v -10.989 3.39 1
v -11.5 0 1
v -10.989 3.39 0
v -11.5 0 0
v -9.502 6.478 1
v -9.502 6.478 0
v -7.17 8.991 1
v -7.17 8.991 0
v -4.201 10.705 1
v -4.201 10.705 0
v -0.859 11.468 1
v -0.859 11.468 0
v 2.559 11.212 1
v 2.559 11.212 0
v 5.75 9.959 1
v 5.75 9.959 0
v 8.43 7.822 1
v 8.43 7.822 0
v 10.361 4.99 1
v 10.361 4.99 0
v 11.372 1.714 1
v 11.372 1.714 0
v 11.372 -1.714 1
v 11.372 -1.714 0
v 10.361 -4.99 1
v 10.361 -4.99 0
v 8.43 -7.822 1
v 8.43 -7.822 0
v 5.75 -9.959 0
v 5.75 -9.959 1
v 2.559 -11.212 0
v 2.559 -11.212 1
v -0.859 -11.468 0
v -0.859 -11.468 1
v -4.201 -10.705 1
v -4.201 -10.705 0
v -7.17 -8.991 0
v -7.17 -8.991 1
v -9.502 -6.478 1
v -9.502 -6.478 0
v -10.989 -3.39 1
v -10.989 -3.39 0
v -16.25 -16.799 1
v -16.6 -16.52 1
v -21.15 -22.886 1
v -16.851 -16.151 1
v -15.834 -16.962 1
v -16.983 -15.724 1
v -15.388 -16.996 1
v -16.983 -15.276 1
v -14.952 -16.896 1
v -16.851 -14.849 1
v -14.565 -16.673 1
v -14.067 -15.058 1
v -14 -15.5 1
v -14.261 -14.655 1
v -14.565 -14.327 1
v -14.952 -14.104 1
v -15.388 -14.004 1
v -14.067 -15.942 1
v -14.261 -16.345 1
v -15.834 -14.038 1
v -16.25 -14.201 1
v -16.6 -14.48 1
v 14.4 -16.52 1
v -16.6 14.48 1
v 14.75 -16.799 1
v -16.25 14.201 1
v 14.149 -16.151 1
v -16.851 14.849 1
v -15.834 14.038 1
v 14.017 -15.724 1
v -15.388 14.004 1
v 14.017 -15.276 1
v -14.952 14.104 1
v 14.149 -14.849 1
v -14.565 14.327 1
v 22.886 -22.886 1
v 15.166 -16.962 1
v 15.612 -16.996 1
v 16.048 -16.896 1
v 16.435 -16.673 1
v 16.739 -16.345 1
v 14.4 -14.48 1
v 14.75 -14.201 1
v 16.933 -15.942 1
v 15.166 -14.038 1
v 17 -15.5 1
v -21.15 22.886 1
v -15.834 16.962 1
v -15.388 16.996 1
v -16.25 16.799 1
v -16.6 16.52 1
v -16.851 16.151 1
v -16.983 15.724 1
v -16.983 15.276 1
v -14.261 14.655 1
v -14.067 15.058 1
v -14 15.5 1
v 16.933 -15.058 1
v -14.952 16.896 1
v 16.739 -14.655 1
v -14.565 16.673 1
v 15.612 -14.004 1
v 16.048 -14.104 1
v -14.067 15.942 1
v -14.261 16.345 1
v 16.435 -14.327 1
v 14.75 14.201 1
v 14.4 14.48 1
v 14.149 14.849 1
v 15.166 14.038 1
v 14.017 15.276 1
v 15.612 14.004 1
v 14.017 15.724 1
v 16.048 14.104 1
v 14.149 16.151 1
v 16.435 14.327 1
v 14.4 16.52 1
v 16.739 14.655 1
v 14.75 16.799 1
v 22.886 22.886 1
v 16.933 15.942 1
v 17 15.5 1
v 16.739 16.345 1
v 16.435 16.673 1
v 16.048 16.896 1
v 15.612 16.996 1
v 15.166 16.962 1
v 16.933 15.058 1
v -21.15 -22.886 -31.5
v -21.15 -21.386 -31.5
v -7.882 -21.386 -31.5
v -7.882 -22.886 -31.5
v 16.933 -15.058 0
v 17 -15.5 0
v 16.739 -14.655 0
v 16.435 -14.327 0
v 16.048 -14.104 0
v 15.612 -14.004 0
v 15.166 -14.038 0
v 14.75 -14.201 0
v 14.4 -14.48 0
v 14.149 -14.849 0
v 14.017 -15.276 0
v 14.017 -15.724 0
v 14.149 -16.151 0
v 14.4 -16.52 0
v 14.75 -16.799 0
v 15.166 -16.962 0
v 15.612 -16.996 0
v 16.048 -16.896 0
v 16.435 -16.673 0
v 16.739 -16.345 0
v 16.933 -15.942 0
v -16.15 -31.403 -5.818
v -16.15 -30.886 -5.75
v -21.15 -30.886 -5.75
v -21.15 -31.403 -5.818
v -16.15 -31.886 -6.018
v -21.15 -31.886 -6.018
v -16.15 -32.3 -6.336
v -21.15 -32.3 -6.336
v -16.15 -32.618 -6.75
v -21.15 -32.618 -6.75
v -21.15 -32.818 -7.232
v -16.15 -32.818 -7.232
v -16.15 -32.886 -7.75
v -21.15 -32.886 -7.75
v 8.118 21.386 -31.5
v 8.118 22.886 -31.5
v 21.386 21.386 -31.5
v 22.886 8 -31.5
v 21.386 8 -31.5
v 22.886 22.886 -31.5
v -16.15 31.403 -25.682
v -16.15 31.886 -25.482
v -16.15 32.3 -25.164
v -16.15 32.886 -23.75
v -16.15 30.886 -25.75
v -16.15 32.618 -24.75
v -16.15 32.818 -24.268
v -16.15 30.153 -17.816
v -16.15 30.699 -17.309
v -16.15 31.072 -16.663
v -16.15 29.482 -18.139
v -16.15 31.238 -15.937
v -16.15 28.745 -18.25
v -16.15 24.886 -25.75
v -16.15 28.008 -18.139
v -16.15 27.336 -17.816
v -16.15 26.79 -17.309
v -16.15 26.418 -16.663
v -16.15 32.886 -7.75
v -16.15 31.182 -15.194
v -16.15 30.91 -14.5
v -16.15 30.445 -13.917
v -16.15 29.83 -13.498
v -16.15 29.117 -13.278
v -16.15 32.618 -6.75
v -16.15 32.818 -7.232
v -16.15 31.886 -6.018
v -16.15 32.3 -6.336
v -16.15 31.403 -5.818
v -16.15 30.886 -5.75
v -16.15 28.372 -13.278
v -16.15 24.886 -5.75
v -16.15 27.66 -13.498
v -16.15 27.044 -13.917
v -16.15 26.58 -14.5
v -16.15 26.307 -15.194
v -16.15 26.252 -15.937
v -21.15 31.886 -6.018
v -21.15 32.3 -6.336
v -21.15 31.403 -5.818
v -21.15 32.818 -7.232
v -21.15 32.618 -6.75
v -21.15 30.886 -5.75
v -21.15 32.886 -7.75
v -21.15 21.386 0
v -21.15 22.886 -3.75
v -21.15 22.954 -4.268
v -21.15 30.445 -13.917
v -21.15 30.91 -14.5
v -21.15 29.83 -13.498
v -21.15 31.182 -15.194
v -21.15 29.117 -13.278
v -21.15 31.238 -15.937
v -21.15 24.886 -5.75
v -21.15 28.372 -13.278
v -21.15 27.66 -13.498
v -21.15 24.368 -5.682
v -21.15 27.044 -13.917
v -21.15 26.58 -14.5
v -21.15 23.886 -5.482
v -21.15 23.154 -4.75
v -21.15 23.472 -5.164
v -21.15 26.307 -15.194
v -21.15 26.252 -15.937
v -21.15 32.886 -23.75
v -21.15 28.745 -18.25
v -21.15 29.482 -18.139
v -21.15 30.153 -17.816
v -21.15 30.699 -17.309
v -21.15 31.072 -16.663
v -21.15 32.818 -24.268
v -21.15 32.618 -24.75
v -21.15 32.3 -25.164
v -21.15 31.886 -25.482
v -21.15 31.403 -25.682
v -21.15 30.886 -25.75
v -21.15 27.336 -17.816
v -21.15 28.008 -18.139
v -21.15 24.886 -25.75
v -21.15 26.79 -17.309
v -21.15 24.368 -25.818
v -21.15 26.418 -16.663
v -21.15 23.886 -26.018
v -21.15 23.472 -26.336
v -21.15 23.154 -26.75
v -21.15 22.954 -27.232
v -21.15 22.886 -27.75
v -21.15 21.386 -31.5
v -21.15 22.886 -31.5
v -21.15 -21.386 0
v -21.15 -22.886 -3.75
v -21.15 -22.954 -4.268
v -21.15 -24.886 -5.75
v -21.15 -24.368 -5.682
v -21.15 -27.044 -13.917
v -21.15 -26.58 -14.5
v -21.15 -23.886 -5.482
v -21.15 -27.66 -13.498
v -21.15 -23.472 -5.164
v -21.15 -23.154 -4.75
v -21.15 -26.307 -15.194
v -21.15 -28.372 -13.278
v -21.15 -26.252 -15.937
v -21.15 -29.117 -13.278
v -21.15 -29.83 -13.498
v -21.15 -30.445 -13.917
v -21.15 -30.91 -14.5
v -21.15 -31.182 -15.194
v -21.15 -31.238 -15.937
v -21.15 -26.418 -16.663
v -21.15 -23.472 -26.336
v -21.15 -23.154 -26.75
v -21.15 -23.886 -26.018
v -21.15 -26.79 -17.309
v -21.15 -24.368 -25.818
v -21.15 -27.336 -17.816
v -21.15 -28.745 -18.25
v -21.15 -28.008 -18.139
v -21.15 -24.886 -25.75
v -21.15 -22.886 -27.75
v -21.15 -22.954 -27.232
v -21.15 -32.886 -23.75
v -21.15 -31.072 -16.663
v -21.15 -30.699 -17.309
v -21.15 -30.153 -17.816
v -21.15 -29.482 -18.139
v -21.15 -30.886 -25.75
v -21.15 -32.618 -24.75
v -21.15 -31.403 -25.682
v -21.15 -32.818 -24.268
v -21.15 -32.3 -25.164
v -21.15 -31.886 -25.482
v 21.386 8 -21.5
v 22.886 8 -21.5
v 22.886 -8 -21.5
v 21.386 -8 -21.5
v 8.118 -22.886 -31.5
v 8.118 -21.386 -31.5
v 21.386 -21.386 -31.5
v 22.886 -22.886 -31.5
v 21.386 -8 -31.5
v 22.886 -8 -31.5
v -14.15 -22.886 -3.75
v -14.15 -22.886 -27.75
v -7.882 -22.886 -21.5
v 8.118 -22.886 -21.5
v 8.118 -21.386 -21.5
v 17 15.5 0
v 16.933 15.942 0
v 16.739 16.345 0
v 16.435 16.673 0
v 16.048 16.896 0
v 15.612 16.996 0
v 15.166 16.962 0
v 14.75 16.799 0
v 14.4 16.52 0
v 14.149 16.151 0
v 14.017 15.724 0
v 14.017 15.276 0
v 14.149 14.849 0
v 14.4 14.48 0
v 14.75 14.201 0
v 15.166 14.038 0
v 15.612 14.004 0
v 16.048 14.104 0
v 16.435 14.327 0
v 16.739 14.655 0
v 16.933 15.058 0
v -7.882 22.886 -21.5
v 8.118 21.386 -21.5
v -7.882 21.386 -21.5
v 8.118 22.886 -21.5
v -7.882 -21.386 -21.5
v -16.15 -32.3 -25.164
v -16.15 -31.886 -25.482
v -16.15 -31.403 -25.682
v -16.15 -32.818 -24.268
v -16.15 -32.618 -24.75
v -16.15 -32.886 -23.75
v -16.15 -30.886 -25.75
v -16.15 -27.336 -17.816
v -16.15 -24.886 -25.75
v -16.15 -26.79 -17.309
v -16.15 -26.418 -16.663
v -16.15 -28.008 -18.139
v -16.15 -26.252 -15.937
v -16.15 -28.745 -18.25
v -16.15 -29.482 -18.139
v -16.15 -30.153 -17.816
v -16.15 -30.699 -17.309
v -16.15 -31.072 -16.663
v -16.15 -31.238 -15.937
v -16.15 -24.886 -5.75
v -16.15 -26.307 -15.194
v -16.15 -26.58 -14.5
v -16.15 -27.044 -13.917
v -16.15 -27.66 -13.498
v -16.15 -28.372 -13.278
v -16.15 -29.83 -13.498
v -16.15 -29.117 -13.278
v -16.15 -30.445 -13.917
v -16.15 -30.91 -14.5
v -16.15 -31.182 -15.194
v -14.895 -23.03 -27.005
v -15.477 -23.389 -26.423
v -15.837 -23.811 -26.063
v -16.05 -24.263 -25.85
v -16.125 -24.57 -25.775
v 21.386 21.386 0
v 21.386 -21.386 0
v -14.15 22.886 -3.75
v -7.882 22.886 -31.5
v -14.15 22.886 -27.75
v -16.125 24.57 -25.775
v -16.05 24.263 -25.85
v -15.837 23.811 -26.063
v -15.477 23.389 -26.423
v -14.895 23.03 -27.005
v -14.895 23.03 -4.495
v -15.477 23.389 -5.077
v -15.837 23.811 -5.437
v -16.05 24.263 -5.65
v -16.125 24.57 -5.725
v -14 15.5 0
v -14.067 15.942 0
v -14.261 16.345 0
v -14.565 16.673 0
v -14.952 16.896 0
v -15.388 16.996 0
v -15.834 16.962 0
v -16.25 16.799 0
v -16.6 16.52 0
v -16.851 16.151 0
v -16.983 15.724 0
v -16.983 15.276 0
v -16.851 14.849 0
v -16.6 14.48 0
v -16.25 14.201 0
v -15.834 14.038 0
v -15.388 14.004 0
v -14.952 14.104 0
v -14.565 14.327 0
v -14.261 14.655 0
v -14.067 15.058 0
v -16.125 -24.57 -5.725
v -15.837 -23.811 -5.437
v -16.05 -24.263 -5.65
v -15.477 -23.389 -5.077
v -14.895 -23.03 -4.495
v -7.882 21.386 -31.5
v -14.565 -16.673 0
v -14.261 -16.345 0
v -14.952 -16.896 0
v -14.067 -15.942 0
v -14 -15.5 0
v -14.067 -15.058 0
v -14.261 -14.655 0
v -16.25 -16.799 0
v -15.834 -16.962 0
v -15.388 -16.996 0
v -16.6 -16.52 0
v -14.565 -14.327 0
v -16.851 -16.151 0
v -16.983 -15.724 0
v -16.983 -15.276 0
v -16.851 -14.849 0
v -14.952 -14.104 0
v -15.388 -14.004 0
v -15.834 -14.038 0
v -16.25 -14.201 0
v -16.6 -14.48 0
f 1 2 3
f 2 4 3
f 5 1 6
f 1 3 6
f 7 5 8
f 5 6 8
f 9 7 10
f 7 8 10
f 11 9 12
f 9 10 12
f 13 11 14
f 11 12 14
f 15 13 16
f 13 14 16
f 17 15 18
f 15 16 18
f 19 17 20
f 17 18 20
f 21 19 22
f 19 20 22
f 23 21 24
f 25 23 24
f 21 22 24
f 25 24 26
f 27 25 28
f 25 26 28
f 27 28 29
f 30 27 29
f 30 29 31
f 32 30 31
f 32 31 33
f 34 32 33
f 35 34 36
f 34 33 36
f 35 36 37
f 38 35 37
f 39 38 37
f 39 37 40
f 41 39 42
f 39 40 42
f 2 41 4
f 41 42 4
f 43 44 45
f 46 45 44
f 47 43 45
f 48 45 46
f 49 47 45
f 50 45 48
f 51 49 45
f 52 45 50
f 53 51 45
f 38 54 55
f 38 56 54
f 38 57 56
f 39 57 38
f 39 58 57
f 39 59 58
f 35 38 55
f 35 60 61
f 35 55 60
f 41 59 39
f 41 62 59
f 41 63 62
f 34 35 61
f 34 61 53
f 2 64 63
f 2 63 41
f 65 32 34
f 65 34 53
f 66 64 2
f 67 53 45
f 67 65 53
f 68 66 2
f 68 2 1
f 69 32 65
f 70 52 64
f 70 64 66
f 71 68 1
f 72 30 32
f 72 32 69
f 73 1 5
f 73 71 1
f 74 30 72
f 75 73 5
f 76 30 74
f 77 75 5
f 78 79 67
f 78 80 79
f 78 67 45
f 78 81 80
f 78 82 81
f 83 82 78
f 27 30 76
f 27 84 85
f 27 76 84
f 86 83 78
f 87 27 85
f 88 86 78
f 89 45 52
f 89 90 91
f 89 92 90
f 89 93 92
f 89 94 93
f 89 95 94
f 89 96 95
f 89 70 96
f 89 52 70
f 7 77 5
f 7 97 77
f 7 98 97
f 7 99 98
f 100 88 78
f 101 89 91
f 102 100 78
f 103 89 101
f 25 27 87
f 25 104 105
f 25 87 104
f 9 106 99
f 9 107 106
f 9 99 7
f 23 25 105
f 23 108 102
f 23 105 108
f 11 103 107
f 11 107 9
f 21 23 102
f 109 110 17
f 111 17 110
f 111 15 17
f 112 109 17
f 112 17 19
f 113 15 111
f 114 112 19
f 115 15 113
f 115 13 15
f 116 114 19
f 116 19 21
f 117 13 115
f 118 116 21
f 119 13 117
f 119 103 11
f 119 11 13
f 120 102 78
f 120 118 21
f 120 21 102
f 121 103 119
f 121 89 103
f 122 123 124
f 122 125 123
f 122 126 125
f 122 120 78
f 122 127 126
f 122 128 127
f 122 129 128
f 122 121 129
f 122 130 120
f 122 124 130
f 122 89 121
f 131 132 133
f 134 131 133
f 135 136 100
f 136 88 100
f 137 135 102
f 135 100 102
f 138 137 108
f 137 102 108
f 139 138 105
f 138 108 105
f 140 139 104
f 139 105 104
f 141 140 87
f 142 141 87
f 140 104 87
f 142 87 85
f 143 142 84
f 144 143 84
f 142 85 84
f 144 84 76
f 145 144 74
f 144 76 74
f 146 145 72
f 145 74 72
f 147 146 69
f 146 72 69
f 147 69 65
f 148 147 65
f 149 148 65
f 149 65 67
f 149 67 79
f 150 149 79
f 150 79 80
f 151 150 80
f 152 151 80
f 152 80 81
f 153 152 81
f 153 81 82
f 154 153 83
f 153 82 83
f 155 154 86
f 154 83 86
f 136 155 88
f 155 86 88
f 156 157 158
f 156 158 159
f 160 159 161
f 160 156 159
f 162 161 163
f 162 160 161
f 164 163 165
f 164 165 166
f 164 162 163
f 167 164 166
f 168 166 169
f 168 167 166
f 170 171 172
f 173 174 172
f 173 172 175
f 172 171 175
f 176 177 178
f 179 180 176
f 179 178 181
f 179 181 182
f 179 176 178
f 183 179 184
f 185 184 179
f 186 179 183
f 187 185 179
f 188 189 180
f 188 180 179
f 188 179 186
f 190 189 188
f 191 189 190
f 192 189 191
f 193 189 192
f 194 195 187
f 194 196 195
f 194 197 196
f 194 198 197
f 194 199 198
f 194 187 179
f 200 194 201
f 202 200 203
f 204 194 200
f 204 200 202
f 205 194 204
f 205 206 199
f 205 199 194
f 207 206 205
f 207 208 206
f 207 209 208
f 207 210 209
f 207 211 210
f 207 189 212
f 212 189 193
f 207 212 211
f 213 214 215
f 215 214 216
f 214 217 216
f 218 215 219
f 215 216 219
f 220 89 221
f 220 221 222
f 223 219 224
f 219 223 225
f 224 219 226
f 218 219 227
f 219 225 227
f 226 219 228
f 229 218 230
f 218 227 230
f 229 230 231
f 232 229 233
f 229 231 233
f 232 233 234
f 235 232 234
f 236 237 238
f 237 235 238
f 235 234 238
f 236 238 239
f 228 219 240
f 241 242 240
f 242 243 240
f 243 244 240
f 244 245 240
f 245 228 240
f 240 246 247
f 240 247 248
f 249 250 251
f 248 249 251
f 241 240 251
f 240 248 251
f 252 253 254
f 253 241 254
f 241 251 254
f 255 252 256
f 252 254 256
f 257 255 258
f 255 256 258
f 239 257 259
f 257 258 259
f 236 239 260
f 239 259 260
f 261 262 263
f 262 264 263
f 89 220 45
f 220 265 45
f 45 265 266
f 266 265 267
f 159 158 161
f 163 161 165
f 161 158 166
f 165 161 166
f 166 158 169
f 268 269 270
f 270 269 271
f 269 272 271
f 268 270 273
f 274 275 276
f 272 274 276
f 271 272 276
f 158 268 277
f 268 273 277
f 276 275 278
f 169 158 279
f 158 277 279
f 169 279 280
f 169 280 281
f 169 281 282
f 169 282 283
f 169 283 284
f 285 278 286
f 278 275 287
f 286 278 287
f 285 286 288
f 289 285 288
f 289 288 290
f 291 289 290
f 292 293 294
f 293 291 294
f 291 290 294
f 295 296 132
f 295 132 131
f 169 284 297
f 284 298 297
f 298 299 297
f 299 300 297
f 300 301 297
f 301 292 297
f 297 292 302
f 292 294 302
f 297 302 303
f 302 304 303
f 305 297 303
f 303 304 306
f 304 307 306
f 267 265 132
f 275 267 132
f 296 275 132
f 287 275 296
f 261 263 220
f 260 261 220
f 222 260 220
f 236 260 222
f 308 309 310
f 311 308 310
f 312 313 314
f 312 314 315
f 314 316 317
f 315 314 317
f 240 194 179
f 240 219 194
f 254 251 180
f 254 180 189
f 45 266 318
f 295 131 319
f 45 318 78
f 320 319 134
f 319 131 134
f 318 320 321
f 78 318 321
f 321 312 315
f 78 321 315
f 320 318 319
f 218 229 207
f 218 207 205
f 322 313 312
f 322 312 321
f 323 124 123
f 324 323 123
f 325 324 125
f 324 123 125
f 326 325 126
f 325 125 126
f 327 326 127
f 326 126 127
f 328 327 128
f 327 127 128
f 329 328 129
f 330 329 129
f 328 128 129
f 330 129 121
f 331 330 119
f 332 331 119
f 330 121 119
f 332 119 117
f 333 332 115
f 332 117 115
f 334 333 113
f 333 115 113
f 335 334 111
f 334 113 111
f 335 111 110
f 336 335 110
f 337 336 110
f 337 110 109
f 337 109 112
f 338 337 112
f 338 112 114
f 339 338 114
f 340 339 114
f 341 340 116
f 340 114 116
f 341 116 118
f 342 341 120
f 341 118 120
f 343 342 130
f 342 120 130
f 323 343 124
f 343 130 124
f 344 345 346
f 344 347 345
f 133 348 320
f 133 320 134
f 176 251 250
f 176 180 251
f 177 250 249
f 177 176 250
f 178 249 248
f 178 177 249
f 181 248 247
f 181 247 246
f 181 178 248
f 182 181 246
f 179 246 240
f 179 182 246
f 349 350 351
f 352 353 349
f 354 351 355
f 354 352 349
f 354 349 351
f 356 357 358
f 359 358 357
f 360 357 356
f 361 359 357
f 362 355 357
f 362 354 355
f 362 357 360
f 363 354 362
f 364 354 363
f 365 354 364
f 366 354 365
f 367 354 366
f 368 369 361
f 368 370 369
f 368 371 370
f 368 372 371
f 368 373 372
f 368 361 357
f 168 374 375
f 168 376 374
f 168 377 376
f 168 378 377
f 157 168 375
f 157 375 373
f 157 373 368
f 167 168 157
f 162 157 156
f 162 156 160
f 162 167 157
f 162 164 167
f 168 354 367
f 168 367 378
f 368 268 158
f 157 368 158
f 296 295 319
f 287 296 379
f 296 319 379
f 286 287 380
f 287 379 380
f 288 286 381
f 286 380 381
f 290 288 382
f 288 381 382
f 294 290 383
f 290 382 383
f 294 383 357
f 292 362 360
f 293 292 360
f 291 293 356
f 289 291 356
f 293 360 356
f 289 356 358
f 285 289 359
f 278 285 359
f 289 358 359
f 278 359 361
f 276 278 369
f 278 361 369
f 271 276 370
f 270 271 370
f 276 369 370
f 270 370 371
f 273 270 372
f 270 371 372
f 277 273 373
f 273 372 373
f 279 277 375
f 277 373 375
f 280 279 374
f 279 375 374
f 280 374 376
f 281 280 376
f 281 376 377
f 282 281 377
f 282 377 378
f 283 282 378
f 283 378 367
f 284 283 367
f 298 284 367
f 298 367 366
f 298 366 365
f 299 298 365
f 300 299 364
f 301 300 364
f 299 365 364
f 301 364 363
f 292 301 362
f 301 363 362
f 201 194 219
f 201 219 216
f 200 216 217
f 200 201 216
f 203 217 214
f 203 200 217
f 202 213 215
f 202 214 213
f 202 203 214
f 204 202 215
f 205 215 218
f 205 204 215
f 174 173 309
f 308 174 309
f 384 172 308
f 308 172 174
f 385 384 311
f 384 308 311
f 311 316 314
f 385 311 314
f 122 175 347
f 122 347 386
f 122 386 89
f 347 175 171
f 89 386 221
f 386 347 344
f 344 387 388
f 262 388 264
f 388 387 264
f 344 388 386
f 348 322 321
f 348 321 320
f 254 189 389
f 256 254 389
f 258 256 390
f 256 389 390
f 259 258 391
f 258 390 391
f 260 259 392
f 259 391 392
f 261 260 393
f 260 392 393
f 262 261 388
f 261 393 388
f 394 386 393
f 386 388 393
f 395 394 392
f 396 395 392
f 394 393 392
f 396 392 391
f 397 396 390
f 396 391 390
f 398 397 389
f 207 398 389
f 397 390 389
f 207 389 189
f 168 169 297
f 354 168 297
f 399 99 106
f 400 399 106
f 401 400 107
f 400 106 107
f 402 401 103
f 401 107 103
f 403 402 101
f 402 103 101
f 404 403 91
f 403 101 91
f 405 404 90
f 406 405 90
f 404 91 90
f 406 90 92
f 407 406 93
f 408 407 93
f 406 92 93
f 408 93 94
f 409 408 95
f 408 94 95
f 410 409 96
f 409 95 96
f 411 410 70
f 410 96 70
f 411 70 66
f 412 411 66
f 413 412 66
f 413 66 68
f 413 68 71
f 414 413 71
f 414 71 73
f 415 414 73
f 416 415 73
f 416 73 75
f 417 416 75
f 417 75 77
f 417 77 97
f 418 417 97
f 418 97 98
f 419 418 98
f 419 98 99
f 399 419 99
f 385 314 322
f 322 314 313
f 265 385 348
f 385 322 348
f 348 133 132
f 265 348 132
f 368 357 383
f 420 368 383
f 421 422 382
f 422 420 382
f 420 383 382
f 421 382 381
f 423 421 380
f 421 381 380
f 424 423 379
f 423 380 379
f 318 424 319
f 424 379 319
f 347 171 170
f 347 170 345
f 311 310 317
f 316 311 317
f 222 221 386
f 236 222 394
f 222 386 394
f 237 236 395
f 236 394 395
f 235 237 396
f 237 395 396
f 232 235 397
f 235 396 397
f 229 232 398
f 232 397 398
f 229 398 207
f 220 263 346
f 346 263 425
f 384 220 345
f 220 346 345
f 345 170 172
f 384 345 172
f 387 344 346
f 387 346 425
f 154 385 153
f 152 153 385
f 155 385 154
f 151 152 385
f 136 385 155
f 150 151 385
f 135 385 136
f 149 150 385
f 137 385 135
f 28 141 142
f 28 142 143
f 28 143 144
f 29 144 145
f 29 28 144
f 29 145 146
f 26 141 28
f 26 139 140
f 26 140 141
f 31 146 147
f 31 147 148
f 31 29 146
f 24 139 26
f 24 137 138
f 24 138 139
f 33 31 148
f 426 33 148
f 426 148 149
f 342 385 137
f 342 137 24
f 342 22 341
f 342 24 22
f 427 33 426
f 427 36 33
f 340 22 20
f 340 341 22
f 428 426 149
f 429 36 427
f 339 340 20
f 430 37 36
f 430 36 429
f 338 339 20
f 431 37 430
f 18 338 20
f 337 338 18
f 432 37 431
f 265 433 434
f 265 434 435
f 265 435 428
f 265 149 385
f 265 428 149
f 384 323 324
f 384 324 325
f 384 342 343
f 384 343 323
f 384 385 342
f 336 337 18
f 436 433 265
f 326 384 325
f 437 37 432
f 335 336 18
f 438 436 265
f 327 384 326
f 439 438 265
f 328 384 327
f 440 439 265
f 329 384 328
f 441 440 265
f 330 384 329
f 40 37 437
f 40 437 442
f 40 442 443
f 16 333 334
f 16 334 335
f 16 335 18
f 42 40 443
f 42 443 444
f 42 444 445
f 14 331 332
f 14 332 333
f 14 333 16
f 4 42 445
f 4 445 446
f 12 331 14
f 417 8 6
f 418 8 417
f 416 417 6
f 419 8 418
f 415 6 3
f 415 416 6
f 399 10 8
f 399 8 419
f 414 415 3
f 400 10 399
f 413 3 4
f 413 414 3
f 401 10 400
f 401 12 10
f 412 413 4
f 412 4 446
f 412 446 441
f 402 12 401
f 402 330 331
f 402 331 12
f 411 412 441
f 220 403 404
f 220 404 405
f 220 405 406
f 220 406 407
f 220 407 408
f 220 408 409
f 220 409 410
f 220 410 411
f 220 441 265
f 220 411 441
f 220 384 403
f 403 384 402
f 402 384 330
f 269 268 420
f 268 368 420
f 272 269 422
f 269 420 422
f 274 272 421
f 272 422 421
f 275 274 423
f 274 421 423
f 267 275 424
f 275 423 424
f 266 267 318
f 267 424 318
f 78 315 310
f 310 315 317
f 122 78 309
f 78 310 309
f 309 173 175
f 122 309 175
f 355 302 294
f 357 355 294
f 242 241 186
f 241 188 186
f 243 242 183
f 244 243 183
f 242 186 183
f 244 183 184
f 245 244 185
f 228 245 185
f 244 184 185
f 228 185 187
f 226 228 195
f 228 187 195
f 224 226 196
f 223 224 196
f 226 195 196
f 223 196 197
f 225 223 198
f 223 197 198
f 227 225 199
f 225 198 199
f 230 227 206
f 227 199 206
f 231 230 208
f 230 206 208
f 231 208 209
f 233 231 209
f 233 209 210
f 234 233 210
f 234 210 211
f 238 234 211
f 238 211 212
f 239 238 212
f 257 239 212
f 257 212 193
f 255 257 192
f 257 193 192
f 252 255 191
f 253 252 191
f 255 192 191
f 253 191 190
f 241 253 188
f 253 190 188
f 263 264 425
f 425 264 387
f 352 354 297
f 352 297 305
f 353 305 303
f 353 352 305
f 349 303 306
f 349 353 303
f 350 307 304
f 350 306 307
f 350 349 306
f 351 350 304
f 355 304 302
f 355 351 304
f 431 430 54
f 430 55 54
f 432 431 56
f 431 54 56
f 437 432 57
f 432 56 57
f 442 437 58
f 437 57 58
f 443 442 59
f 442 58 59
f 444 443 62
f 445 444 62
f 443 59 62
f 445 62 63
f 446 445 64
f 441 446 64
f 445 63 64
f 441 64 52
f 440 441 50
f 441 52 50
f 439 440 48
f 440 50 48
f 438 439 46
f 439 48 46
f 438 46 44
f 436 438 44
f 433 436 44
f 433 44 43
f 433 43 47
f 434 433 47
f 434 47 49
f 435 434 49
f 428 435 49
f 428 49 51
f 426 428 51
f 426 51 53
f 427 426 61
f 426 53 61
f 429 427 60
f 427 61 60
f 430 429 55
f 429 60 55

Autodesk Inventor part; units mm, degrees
ref_plane "YZ Plane" through (0, 0, 0) normal (1, 0, 0) x (0, 1, 0)
ref_plane "XZ Plane" through (0, 0, 0) normal (0, 1, 0) x (-1, 0, 0)
sketch "Sketch1" plane through (0, 0, 0) normal (0, 0, 1) x (1, 0, 0)
  line L0 (20.0607, 17.4322) -> (17.4322, 20.0607) construction
  arc A0 (17.4322, 20.0607) -> (16.3716, 20.5) centre (16.3716, 19) ccw construction
  line L1 (16.3716, 20.5) -> (-16.3716, 20.5) construction
  arc A1 (-16.3716, 20.5) -> (-17.4322, 20.0607) centre (-16.3716, 19) ccw construction
  line L2 (-17.4322, 20.0607) -> (-20.0607, 17.4322) construction
  arc A2 (-20.0607, 17.4322) -> (-20.5, 16.3716) centre (-19, 16.3716) ccw construction
  line L3 (-20.5, 16.3716) -> (-20.5, -16.3716) construction
  arc A3 (-20.5, -16.3716) -> (-20.0607, -17.4322) centre (-19, -16.3716) ccw construction
  line L4 (-20.0607, -17.4322) -> (-17.4322, -20.0607) construction
  arc A4 (-17.4322, -20.0607) -> (-16.3716, -20.5) centre (-16.3716, -19) ccw construction
  line L5 (-16.3716, -20.5) -> (16.3716, -20.5) construction
  arc A5 (16.3716, -20.5) -> (17.4322, -20.0607) centre (16.3716, -19) ccw construction
  line L6 (17.4322, -20.0607) -> (20.0607, -17.4322) construction
  arc A6 (20.0607, -17.4322) -> (20.5, -16.3716) centre (19, -16.3716) ccw construction
  line L7 (20.5, -16.3716) -> (20.5, 16.3716) construction
  arc A7 (20.5, 16.3716) -> (20.0607, 17.4322) centre (19, 16.3716) ccw construction
  circle A8 centre (0, 0) radius 16.5 construction
  circle A9 centre (15.5, 15.5) radius 1.55 construction
  circle A10 centre (15.5, -15.5) radius 1.55 construction
  circle A11 centre (-15.5, -15.5) radius 1.55 construction
  circle A12 centre (-15.5, 15.5) radius 1.55 construction
  line L8 (0, 0) -> (-20.3858, 0) construction
  line L9 (-20.3858, 0) -> (-20.3858, -20.3858) construction
  line L10 (-20.3858, -20.3858) -> (0, -20.3858) construction
  line L11 (0, -20.3858) -> (0, 0) construction
  line L12 (0, 0) -> (-20.3858, 0) construction
  line L13 (-20.3858, 0) -> (-20.3858, 20.3858) construction
  line L14 (-20.3858, 20.3858) -> (0, 20.3858) construction
  line L15 (0, 20.3858) -> (0, 0) construction
  line L16 (0, 0) -> (20.3858, 0) construction
  line L17 (20.3858, 0) -> (20.3858, 20.3858) construction
  line L18 (20.3858, 20.3858) -> (0, 20.3858) construction
  line L19 (0, 20.3858) -> (0, 0) construction
  line L20 (0, 0) -> (20.3858, 0) construction
  line L21 (20.3858, 0) -> (20.3858, -20.3858) construction
  line L22 (20.3858, -20.3858) -> (0, -20.3858) construction
  line L23 (0, -20.3858) -> (0, 0) construction
  line L24 (-20.3858, -20.3858) -> (20.3858, -20.3858)
  line L25 (20.3858, -20.3858) -> (20.3858, 20.3858)
  line L26 (20.3858, 20.3858) -> (-20.3858, 20.3858)
  line L27 (-20.3858, 20.3858) -> (-20.3858, -20.3858)
  line L28 (-21.15, -107.4) -> (-21.15, 107.4) projected
  line L29 (-21.15, 22.8858) -> (22.8858, 22.8858)
  line L30 (22.8858, 22.8858) -> (22.8858, -22.8858)
  line L31 (22.8858, -22.8858) -> (-21.15, -22.8858)
  point P0 (0, 0)
  dimension "d0" = 2.5
ref_plane "Work Plane1" through (-21.15, -21.15, -31.5) normal (0, 0, -1) x (0, 1, 0)
extrude "Extrusion1" add sketch "Sketch1" against normal up to surface (31.5 mm away)
ref_plane "Work Plane2" through (-21.15, -10, -125) normal (1, 0, 0) x (0, 0, 1)
sketch "Sketch2" plane through (-21.15, -10, -125) normal (1, 0, 0) x (0, 0, 1)
  line L0 (125, 12.8858) -> (125, -32.8858) projected
  line L1 (93.5, 12.8858) -> (93.5, -32.8858) projected
  line L2 (125, -32.8858) -> (93.5, -32.8858) projected
  line L3 (125, 12.8858) -> (125, -32.8858) projected
  line L4 (125, 12.8858) -> (93.5, 12.8858) projected
  line L5 (125, -10) -> (93.5, -10) construction
  line L6 (109.25, 12.8858) -> (109.25, -32.8858) construction
  line L7 (109.25, -32.8858) -> (119.25, -32.8858) construction
  line L8 (119.25, -32.8858) -> (119.25, -42.8858)
  line L9 (119.25, -42.8858) -> (109.25, -42.8858)
  line L10 (109.25, -42.8858) -> (109.25, -32.8858) construction
  line L11 (109.25, -42.8858) -> (99.25, -42.8858)
  line L12 (99.25, -42.8858) -> (99.25, -32.8858)
  line L13 (99.25, -32.8858) -> (109.25, -32.8858) construction
  line L14 (109.25, -32.8858) -> (109.25, -42.8858) construction
  line L15 (125, 12.8858) -> (93.5, 12.8858)
  line L16 (119.25, 12.8858) -> (119.25, 22.8858)
  line L17 (119.25, 22.8858) -> (109.25, 22.8858)
  line L18 (109.25, 22.8858) -> (99.25, 22.8858)
  line L19 (99.25, 22.8858) -> (99.25, 12.8858)
  dimension "d3" = 10
  dimension "d4" = 10
  dimension "d5" = 10
  dimension "d6" = 10
extrude "Extrusion2" add sketch "Sketch2" along normal blind 5 contours L4 L19 L18 L17 L16 | L8 L9 L11 L12 L2
sketch "Sketch3" plane through (0, 0, 0) normal (0, 0, 1) x (1, 0, 0)
  line L0 (22.8858, 22.8858) -> (-21.15, 22.8858) projected
  line L1 (-21.15, 22.8858) -> (-21.15, -22.8858) projected
  line L2 (22.8858, 22.8858) -> (-21.15, 22.8858)
  line L3 (-21.15, 22.8858) -> (-21.15, -22.8858)
  line L4 (-21.15, -22.8858) -> (22.8858, -22.8858)
  line L5 (22.8858, -22.8858) -> (22.8858, 22.8858)
  circle A0 centre (-15.5, 15.5) radius 1.25 projected
  circle A1 centre (15.5, 15.5) radius 1.25 projected
  circle A2 centre (-15.5, -15.5) radius 1.25 projected
  circle A3 centre (15.5, -15.5) radius 1.25 projected
  circle A4 centre (0, 0) radius 11 projected
  point P0 (0, 0)
extrude "Extrusion3" add sketch "Sketch3" along normal blind 1
fillet "Fillet1" radius 2 10 edges at (-18.65, 22.8858, -25.75) (-18.65, 32.8858, -25.75) (-18.65, 32.8858, -5.75) (-18.65, 22.8858, -5.75) (-18.65, -22.8858, -25.75) (-18.65, -32.8858, -25.75) (-18.65, -32.8858, -5.75) (-18.65, -22.8858, -5.75) (-16.15, -22.8858, -15.75) (-16.15, 22.8858, -15.75)
sketch "Sketch4" plane through (-16.15, -10, -125) normal (1, 0, 0) x (0, 0, -1)
  arc A0 (-117.25, 42.8858) -> (-119.25, 40.8858) centre (-117.25, 40.8858) ccw projected
  line L0 (-119.25, 40.8858) -> (-119.25, 34.8858) projected
  line L1 (-99.25, 34.8858) -> (-119.25, 34.8858) projected
  line L2 (-99.25, 34.8858) -> (-99.25, 40.8858) projected
  arc A1 (-99.25, 40.8858) -> (-101.25, 42.8858) centre (-101.25, 40.8858) ccw projected
  line L3 (-101.25, 42.8858) -> (-117.25, 42.8858) projected
  arc A2 (-119.25, -20.8858) -> (-117.25, -22.8858) centre (-117.25, -20.8858) ccw projected
  line L4 (-117.25, -22.8858) -> (-101.25, -22.8858) projected
  arc A3 (-101.25, -22.8858) -> (-99.25, -20.8858) centre (-101.25, -20.8858) ccw projected
  line L5 (-99.25, -20.8858) -> (-99.25, -14.8858) projected
  line L6 (-119.25, -14.8858) -> (-99.25, -14.8858) projected
  line L7 (-119.25, -14.8858) -> (-119.25, -20.8858) projected
  circle A4 centre (-109.25, 38.7448) radius 2.5
  line L8 (-215.88, 9.0017) -> (215.88, 9.0017) construction
  line L9 (-126, 32.8858) -> (-126, -12.8858) construction
  line L10 (-126, 10) -> (-93.5, 10) construction
  line L11 (-93.5, 32.8858) -> (-93.5, -12.8858) construction
  circle A5 centre (-109.25, -18.7448) radius 2.5
  point P0 (-125, 10)
  dimension "d12" = 5
extrude "Extrusion4" cut sketch "Sketch4" against normal up to surface (5 mm away) contours A4 | A5
sketch "Sketch5" plane through (0, 0, 0) normal (0, 0, -1) x (-1, 0, 0)
  circle A0 centre (0, 0) radius 11 projected
  circle A1 centre (0, 0) radius 11.5
  point P0 (0, 0)
  dimension "d15" = 0.5
extrude "Extrusion5" cut sketch "Sketch5" against normal up to surface (1 mm away) contours A0 | A1
sketch "Sketch6" plane through (22.8858, 22.8858, -31.5) normal (0, 0, -1) x (-1, 0, 0)
  line L0 (43.2716, -2.5) -> (2.5, -2.5) projected
  line L1 (43.2716, -43.2716) -> (43.2716, -2.5) projected
  line L2 (2.5, -43.2716) -> (43.2716, -43.2716) projected
  line L3 (2.5, -2.5) -> (2.5, -43.2716) projected
  line L4 (44.0358, 0) -> (44.0358, -45.7716) projected
  line L5 (0, 0) -> (44.0358, 0) projected
  line L6 (0, -45.7716) -> (0, 0) projected
  line L7 (44.0358, -45.7716) -> (0, -45.7716) projected
  line L8 (1.5, -44.2716) -> (44.2716, -44.2716)
  line L9 (44.2716, -44.2716) -> (44.2716, -1.5)
  line L10 (44.2716, -1.5) -> (1.5, -1.5)
  line L11 (1.5, -1.5) -> (1.5, -44.2716)
  line L12 (44.2716, -44.2716) -> (44.0358, -44.2716)
  line L13 (44.2716, -1.5) -> (44.0358, -1.5)
  point P0 (22.8858, -22.8858)
  dimension "d18" = 1
extrude "Extrusion6" cut sketch "Sketch6" against normal up to surface (31.5 mm away) contours L10 L9 L8 L4 | L4 L8 L11 L10
sketch "Sketch7" plane through (22.8858, -22.8858, -31.5) normal (1, 0, 0) x (0, 0, -1)
  line L0 (-10, 30.8858) -> (-10, 14.8858)
  line L1 (-10, 14.8858) -> (0, 14.8858)
  line L2 (0, 30.8858) -> (-10, 30.8858)
  line L3 (0, 1.5) -> (0, 44.2716) projected
  line L4 (-10, 30.8858) -> (0, 22.8858) construction
  line L5 (-10, 14.8858) -> (0, 22.8858) construction
  point P0 (-31.5, 22.8858)
  dimension "d21" = 16
extrude "Extrusion7" cut sketch "Sketch7" against normal up to surface (1.5 mm away)
sketch "Sketch8" plane through (-21.15, 22.8858, -31.5) normal (0, 1, 0) x (1, 0, 0)
  line L0 (29.2679, 0) -> (29.2679, -10)
  line L1 (29.2679, -10) -> (13.2679, -10)
  line L2 (13.2679, -10) -> (13.2679, 0)
  line L3 (42.5358, 0) -> (0, 0) projected
  line L4 (21.2679, 0) -> (29.2679, -10) construction
  line L5 (21.2679, 0) -> (13.2679, -10) construction
  point P0 (21.15, -31.5)
extrude "Extrusion8" cut sketch "Sketch8" against normal up to surface (45.7716 mm away)
sketch "Sketch9" plane through (0, 0, 1) normal (0, 0, 1) x (1, 0, 0)
  circle A0 centre (0, 0) radius 11.5 projected
  line L0 (22.8858, 22.8858) -> (-21.15, 22.8858) projected
  line L1 (-21.15, 22.8858) -> (-21.15, -22.8858) projected
  line L2 (-21.15, -22.8858) -> (22.8858, -22.8858) projected
  line L3 (22.8858, -22.8858) -> (22.8858, 22.8858) projected
  circle A1 centre (15.5, -15.5) radius 1.25 projected
  circle A2 centre (-15.5, -15.5) radius 1.25 projected
  circle A3 centre (15.5, 15.5) radius 1.25 projected
  circle A4 centre (-15.5, 15.5) radius 1.25 projected
  circle A5 centre (-15.5, 15.5) radius 1.5
  circle A6 centre (15.5, 15.5) radius 1.5
  circle A7 centre (15.5, -15.5) radius 1.5
  circle A8 centre (-15.5, -15.5) radius 1.5
  point P0 (0, 0)
  dimension "d29" = 0.25
  dimension "d30" = 0.25
  dimension "d31" = 0.25
  dimension "d32" = 0.25
extrude "Extrusion9" cut sketch "Sketch9" against normal up to surface (1 mm away) contours A1 | A2 | A3 | A5 | A6 | A7 | A8
properties part number "Nema17WheelMotorMountoffset"
